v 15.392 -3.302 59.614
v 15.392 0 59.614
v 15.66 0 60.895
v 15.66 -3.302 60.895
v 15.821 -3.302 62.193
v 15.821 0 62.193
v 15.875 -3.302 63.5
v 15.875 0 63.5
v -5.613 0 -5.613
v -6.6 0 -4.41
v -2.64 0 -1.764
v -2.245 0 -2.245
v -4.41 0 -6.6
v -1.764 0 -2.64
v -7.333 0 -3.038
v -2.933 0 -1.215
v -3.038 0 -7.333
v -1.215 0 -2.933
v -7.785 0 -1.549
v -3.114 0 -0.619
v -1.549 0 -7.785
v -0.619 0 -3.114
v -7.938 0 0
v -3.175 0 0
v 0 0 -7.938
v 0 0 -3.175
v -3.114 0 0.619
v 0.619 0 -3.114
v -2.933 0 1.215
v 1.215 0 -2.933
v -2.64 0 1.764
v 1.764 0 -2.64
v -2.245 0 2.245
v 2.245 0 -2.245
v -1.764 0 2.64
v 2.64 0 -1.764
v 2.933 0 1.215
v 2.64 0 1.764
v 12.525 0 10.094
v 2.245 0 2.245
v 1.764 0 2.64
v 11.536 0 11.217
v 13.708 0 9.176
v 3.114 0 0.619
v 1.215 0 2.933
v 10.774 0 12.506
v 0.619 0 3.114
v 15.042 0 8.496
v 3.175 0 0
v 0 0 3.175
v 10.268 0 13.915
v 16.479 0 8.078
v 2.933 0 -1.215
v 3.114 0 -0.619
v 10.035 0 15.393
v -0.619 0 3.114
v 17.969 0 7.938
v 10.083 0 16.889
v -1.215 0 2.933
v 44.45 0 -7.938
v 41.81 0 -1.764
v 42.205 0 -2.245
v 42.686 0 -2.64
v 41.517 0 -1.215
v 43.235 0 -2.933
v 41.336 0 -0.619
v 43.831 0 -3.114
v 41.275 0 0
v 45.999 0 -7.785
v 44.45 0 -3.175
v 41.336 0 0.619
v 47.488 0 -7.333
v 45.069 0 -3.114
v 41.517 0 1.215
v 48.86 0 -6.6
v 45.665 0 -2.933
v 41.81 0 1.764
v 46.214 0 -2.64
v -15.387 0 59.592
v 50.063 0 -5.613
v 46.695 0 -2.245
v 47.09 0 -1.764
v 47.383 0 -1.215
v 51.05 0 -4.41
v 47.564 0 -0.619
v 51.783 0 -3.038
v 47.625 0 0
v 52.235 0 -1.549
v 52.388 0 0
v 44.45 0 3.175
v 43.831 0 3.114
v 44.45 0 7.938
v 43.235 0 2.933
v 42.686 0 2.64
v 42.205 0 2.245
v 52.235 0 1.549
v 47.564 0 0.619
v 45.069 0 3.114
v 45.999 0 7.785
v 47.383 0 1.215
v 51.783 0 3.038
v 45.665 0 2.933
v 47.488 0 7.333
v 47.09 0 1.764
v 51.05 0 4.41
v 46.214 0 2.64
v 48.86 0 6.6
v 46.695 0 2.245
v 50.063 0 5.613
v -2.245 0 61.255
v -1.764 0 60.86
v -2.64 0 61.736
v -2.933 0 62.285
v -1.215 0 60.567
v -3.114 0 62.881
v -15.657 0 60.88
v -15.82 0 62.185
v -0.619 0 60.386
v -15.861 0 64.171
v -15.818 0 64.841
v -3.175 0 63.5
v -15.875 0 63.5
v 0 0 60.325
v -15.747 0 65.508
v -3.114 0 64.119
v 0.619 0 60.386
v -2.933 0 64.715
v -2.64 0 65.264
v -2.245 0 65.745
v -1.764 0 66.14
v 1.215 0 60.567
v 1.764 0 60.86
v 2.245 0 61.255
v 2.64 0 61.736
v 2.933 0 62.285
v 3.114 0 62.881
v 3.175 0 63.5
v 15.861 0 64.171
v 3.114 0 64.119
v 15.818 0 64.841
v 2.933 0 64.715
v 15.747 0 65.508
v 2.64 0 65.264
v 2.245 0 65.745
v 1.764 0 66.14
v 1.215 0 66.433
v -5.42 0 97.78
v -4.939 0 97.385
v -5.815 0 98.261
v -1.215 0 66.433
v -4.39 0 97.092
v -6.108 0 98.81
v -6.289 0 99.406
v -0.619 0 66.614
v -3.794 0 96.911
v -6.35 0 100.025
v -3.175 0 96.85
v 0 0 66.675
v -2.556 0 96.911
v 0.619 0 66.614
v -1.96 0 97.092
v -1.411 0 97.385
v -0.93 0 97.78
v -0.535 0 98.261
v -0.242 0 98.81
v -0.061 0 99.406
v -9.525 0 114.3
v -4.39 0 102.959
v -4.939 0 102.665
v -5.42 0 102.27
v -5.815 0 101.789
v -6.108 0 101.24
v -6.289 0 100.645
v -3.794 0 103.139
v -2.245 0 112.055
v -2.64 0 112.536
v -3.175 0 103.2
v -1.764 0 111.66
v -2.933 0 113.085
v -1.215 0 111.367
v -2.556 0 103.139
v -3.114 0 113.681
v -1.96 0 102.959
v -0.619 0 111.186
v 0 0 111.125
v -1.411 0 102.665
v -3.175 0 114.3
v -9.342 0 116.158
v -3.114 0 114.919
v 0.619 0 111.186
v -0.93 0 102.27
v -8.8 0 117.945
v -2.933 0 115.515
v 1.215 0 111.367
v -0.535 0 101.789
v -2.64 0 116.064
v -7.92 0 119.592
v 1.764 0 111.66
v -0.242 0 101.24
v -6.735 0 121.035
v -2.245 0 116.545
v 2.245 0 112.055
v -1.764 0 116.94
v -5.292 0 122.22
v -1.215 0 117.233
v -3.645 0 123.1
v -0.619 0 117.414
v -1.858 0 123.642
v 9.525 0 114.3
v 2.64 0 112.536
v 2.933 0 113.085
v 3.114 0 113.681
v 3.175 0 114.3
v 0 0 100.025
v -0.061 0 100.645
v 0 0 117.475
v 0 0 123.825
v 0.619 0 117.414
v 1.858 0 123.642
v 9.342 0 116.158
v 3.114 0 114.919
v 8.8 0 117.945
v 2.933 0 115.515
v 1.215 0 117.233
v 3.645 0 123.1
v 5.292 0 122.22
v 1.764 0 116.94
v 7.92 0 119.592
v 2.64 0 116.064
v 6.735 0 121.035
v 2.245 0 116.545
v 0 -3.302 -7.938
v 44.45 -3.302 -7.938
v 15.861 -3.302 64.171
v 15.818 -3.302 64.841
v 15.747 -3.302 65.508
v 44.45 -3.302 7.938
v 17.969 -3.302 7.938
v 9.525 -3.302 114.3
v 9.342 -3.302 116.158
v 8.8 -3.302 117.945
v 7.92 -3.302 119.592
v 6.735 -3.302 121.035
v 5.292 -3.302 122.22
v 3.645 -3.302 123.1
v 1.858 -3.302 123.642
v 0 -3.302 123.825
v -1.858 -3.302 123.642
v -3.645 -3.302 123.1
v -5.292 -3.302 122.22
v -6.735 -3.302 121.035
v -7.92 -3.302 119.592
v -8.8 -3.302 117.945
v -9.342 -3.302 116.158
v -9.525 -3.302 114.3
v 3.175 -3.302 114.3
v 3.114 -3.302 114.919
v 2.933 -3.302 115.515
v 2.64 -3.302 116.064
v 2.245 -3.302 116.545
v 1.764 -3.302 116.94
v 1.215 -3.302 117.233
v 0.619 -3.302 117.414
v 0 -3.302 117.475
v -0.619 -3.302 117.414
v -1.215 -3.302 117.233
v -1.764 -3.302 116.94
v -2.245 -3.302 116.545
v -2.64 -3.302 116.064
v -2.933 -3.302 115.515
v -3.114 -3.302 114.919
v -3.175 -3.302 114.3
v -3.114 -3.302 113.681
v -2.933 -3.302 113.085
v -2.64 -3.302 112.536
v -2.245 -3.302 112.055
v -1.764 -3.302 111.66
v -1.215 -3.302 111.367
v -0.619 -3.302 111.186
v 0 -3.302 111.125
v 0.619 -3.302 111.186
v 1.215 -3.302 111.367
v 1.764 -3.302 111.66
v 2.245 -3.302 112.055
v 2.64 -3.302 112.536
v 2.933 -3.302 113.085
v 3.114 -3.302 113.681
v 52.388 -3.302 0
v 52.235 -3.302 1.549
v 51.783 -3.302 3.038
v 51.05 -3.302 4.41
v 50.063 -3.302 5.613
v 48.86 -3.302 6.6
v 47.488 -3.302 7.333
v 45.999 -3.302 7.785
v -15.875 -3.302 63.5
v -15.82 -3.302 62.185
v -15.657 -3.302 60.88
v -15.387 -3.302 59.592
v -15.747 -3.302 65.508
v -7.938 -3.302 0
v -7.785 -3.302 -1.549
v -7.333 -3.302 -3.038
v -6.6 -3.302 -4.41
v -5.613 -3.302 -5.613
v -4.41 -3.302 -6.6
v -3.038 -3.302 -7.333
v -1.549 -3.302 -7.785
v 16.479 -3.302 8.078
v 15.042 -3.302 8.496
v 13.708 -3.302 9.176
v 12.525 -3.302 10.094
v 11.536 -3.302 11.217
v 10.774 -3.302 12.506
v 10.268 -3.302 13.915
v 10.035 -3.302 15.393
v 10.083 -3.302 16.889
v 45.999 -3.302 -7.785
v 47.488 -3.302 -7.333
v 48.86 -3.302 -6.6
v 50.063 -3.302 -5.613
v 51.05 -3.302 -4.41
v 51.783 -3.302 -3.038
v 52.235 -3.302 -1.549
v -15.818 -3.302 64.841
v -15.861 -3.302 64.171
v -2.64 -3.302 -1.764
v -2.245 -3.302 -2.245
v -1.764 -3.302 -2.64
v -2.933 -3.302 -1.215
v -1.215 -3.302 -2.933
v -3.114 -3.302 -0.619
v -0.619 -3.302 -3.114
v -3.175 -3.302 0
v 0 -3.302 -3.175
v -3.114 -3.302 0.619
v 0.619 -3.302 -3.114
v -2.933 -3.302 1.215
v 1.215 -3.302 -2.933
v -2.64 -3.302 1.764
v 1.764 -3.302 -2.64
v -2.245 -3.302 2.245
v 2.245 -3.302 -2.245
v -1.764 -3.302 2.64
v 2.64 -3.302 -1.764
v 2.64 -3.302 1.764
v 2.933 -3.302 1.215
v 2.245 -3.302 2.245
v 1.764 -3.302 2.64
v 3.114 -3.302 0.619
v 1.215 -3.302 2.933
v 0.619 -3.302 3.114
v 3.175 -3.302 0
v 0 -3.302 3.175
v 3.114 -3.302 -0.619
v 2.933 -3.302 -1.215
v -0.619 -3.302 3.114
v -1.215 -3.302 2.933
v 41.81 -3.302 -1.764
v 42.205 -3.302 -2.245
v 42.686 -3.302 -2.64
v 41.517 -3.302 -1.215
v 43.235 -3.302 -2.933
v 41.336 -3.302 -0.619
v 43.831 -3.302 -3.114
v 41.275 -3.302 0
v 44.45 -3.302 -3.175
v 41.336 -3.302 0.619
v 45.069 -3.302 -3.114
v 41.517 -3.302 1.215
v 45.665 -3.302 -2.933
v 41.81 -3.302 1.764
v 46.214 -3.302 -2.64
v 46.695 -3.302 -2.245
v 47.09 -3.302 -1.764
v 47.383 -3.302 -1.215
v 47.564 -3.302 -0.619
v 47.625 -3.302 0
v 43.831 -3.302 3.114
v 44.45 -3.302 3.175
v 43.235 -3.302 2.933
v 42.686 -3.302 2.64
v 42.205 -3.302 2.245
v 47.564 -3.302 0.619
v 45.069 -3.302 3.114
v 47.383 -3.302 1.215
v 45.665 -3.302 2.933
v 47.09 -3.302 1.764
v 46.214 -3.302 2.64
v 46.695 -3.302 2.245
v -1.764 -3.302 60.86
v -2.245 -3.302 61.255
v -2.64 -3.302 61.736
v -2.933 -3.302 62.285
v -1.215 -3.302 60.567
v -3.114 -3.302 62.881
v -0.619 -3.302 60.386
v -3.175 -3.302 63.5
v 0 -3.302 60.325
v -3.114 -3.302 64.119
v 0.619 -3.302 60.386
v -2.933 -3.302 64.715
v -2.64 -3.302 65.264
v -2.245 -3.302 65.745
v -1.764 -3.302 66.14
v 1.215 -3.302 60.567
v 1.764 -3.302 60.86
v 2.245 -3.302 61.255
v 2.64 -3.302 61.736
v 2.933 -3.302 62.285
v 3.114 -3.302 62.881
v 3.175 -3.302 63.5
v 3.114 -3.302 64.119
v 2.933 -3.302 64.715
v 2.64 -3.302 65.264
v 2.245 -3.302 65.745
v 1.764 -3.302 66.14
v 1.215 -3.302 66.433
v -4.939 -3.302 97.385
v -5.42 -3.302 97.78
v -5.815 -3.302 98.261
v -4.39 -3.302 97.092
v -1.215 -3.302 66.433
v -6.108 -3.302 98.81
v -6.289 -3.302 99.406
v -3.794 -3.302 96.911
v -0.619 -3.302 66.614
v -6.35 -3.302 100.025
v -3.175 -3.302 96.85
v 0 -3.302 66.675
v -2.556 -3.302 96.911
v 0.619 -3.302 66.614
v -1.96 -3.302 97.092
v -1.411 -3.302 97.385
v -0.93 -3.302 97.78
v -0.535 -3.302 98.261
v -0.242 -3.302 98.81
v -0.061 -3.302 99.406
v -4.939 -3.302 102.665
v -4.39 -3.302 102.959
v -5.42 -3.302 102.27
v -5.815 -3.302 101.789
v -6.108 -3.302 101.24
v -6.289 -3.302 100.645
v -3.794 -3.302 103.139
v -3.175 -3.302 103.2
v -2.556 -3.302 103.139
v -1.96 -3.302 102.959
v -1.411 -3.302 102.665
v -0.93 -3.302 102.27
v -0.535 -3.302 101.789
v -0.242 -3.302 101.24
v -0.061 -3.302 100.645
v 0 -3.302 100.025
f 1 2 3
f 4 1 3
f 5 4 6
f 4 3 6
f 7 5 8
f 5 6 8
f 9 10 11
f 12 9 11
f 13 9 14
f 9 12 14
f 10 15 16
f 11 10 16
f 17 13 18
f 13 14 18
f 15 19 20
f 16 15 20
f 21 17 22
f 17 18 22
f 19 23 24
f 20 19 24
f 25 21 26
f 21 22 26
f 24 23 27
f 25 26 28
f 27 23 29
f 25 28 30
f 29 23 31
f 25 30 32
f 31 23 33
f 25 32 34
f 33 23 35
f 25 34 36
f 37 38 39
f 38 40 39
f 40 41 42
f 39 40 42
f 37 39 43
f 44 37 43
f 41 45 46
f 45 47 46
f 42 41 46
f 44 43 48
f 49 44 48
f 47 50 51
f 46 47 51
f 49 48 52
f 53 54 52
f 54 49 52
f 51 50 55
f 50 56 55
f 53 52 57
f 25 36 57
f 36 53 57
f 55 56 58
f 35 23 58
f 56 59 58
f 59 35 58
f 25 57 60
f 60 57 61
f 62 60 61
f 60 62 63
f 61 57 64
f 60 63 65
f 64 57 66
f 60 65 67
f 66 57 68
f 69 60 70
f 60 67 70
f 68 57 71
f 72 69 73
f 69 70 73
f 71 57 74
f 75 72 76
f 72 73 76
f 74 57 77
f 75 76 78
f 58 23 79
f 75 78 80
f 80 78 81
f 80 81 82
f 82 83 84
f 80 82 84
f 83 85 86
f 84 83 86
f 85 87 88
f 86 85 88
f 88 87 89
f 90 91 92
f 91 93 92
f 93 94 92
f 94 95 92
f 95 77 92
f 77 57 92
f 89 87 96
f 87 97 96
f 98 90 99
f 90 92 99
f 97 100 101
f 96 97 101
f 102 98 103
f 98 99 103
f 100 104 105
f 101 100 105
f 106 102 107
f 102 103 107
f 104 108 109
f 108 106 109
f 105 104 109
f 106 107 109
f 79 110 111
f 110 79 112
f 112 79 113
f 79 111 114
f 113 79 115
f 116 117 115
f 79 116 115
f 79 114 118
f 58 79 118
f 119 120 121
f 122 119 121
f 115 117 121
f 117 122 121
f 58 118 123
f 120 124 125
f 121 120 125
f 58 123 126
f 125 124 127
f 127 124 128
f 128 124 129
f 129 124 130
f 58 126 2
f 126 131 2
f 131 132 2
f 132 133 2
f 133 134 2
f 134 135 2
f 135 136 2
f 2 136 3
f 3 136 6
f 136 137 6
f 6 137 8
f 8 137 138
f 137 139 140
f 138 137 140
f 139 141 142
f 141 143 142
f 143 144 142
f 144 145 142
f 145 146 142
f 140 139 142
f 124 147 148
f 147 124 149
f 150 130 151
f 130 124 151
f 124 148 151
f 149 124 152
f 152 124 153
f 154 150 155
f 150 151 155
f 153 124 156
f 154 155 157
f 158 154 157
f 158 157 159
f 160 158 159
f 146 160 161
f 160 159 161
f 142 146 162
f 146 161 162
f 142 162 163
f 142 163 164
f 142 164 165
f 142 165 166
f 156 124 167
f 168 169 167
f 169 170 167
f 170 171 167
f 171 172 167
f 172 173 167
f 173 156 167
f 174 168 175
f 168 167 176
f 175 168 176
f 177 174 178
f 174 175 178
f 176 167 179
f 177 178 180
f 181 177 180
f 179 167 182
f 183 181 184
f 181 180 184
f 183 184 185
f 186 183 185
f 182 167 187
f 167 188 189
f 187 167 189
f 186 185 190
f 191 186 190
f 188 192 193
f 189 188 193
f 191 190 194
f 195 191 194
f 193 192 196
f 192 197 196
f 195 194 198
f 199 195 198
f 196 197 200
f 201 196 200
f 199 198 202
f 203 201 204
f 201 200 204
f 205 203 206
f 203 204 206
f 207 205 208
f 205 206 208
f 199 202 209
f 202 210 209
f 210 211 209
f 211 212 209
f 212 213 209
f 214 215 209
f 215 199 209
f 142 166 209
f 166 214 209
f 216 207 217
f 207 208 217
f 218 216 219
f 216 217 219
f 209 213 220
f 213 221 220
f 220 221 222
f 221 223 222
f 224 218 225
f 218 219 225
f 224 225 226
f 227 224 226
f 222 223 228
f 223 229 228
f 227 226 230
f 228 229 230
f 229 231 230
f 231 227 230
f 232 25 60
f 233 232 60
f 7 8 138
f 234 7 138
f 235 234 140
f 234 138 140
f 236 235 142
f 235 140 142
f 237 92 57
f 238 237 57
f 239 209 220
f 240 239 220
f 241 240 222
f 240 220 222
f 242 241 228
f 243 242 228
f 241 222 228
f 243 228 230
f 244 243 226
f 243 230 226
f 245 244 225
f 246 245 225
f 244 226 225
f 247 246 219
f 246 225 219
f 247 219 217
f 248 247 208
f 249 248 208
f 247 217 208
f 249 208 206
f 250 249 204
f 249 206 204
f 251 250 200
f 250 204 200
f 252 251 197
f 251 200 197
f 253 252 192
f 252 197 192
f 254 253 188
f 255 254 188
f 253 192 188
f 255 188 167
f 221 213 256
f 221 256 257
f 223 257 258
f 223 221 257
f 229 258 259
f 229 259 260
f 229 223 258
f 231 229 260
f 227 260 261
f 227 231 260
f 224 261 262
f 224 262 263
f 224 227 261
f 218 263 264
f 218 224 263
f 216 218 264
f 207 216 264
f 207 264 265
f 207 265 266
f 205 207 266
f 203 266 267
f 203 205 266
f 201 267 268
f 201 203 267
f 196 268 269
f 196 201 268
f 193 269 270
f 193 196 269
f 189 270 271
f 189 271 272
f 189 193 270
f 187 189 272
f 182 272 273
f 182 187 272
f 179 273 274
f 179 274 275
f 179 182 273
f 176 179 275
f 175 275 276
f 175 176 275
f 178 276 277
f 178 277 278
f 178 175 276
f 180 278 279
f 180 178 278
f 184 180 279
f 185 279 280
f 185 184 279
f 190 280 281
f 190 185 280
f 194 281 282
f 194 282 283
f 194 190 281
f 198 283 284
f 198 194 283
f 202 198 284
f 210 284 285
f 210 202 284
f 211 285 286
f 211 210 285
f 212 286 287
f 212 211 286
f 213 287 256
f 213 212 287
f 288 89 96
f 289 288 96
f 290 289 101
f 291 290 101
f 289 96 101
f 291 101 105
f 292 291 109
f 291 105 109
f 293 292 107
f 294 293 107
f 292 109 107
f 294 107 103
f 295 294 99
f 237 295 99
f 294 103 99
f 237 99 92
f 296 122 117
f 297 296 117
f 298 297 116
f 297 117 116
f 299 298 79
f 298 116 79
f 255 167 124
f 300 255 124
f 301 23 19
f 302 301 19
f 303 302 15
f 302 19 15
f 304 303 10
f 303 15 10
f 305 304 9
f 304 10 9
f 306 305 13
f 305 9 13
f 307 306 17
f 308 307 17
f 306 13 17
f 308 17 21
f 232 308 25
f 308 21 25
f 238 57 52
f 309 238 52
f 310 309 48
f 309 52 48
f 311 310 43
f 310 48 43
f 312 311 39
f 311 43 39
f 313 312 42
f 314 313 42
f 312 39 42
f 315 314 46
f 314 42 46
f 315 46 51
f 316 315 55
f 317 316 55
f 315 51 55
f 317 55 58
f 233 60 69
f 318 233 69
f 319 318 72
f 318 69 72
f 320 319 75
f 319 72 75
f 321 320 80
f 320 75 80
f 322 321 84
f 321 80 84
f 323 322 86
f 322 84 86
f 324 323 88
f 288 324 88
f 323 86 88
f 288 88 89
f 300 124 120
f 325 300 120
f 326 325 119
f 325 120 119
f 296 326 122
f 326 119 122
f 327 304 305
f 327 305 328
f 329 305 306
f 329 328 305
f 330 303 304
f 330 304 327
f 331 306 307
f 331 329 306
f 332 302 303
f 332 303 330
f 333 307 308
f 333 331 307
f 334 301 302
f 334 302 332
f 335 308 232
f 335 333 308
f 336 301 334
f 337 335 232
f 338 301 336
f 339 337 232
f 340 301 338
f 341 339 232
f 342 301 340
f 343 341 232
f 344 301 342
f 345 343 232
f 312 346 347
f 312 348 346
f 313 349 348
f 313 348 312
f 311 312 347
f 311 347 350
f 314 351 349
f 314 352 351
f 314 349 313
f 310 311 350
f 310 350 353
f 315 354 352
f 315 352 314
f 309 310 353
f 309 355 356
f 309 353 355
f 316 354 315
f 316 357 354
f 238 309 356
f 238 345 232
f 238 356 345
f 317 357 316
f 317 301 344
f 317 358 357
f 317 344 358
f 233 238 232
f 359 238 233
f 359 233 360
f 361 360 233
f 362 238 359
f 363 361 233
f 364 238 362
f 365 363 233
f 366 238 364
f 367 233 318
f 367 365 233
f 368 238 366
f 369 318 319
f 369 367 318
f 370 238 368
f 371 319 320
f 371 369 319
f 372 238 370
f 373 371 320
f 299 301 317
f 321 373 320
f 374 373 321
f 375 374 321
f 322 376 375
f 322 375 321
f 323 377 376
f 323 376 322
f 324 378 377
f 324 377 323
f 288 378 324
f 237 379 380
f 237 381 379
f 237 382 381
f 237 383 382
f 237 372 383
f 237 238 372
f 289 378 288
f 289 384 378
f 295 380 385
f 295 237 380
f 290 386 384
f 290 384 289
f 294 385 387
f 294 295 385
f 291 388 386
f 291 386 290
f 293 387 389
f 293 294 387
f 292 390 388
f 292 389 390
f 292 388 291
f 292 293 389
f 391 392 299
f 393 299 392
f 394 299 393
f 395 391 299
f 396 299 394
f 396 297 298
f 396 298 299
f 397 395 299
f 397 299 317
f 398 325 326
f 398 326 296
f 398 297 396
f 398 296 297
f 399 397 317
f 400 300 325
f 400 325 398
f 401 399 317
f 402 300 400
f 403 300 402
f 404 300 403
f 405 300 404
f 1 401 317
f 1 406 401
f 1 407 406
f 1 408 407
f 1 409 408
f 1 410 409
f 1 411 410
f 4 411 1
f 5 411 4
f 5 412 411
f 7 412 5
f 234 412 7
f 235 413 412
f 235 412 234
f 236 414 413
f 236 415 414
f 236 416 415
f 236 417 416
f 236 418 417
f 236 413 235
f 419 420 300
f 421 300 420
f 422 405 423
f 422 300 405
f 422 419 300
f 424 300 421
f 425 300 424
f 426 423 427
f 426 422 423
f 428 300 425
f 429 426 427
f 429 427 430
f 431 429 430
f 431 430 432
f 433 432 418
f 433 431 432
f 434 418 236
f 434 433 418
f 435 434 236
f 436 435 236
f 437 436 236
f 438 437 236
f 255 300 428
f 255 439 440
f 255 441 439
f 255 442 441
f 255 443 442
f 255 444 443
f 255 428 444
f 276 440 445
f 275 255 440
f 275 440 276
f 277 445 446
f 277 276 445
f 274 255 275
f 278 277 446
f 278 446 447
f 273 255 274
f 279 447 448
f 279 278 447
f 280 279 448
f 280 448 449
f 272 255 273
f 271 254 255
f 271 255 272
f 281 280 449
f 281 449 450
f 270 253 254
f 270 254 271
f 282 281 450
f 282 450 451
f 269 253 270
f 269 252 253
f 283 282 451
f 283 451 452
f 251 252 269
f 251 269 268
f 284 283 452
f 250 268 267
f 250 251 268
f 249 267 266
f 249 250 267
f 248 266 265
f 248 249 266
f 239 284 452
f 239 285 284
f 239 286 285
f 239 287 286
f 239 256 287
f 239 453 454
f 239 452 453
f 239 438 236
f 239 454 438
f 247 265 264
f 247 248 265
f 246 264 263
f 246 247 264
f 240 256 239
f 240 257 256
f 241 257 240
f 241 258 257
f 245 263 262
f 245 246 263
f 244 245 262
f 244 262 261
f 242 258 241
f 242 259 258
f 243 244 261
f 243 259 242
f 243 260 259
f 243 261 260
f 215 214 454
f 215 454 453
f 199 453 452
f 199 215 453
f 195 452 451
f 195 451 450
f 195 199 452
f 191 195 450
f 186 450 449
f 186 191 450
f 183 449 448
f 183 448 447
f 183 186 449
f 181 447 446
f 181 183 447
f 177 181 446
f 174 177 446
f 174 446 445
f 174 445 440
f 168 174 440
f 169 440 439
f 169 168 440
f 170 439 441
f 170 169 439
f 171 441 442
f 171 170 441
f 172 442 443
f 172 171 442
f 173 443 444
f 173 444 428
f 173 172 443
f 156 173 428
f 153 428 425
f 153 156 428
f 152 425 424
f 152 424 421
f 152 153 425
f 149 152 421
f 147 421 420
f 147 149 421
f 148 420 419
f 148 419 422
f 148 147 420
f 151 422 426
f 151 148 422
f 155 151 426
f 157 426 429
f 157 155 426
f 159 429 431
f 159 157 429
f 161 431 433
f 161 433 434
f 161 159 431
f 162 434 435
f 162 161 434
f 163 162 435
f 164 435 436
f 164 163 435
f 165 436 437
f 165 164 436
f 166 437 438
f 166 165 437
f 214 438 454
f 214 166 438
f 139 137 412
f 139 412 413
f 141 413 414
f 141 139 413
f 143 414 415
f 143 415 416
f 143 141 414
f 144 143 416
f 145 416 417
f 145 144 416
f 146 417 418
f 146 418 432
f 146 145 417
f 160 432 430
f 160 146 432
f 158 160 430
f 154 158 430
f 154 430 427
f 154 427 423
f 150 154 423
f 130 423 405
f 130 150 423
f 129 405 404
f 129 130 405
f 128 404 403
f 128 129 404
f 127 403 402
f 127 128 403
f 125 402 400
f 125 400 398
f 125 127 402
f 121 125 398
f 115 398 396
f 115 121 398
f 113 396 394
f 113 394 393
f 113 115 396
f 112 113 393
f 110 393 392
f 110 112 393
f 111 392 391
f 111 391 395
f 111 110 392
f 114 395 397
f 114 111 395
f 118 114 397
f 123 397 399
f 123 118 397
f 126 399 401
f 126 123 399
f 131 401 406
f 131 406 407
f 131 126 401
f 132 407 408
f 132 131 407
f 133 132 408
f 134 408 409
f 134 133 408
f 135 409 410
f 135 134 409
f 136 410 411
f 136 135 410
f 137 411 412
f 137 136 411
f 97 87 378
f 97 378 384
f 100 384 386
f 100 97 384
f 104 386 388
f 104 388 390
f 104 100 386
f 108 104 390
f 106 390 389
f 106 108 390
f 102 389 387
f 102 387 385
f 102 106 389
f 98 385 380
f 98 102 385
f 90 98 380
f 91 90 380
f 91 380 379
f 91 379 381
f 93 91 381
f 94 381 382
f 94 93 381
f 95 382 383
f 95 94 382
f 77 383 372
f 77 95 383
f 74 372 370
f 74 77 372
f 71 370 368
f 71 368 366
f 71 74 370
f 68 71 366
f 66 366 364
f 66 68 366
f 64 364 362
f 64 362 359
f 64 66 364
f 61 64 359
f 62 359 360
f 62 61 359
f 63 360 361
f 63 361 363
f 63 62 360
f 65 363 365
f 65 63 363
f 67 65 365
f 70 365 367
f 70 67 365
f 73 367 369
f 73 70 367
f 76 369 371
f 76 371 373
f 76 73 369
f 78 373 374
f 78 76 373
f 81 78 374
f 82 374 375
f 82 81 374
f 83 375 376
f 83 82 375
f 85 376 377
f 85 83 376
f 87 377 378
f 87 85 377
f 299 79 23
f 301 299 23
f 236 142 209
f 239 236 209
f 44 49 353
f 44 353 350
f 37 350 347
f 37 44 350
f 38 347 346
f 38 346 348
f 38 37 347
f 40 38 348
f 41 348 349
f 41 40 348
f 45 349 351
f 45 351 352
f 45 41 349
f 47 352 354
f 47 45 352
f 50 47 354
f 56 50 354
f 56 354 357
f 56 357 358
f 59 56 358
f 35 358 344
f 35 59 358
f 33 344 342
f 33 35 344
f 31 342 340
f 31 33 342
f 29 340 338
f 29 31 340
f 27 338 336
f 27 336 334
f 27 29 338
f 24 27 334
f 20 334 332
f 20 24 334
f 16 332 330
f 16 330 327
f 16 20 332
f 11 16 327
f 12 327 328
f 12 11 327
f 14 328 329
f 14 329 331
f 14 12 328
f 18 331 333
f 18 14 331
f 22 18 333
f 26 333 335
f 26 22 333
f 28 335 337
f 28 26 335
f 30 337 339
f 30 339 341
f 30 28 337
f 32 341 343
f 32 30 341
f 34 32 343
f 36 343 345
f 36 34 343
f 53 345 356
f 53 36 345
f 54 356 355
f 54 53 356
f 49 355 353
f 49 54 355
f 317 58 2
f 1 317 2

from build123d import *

# Parameters (mm, degrees)
F0_R     = 3.175
F1_DEPTH = 3.302


with BuildPart() as f1:
    # F0 (on Front) → F1 (new body)
    with BuildSketch(Plane.XZ):
        with BuildLine():
            ThreePointArc((-9.525, 114.3), (0, 104.775), (9.525, 114.3))
            ThreePointArc((9.525, 114.3), (0, 123.825), (-9.525, 114.3))
        make_face()
        with Locations((0, 114.3)):
            Circle(F0_R, mode=Mode.SUBTRACT)
        with BuildLine():
            Line((15.747457, 65.508289), (9.525, 114.3))
            ThreePointArc((9.525, 114.3), (0, 104.775), (-9.525, 114.3))
            Line((-9.525, 114.3), (-15.747457, 65.508289))
            ThreePointArc((-15.747457, 65.508289), (0, 79.375), (15.747457, 65.508289))
        make_face()
        with Locations((-3.175, 100.0252)):
            Circle(F0_R, mode=Mode.SUBTRACT)
        with BuildLine():
            ThreePointArc((15.875, 63.5), (15.843082, 64.506168), (15.747457, 65.508289))
            ThreePointArc((15.747457, 65.508289), (0, 79.375), (-15.747457, 65.508289))
            ThreePointArc((-15.747457, 65.508289), (-15.843082, 64.506168), (-15.875, 63.5))
            Line((-15.875, 63.5), (-15.386538, 59.592308))
            ThreePointArc((-15.386538, 59.592308), (0.011376, 47.625004), (15.392123, 59.614363))
            Line((15.392123, 59.614363), (15.875, 63.5))
        make_face()
        with Locations((0, 63.5)):
            Circle(F0_R, mode=Mode.SUBTRACT)
        with BuildLine():
            ThreePointArc((15.392123, 59.614363), (15.753818, 61.542237), (15.875, 63.5))
            Line((15.875, 63.5), (15.392123, 59.614363))
        make_face()
        with BuildLine():
            Line((-15.386538, 59.592308), (-15.875, 63.5))
            ThreePointArc((-15.875, 63.5), (-15.752411, 61.530949), (-15.386538, 59.592308))
        make_face()
        with BuildLine():
            Line((10.082594, 16.889395), (15.392123, 59.614363))
            ThreePointArc((15.392123, 59.614363), (0.011376, 47.625004), (-15.386538, 59.592308))
            Line((-15.386538, 59.592308), (-7.9375, 0))
            ThreePointArc((-7.9375, 0), (0, 7.9375), (7.9375, 0))
            ThreePointArc((7.9375, 0), (5.61266, -5.61266), (0, -7.9375))
            Line((0, -7.9375), (44.45, -7.9375))
            ThreePointArc((44.45, -7.9375), (36.5125, 0), (44.45, 7.9375))
            Line((44.45, 7.9375), (17.969436, 7.9375))
            ThreePointArc((17.969436, 7.9375), (12.004147, 10.632131), (10.082594, 16.889395))
        make_face()
        with BuildLine():
            ThreePointArc((7.9375, 0), (0, 7.9375), (-7.9375, 0))
            ThreePointArc((-7.9375, 0), (-5.61266, -5.61266), (0, -7.9375))
            ThreePointArc((0, -7.9375), (5.61266, -5.61266), (7.9375, 0))
        make_face()
        Circle(F0_R, mode=Mode.SUBTRACT)
        with BuildLine():
            ThreePointArc((52.3875, 0), (50.06266, 5.61266), (44.45, 7.9375))
            ThreePointArc((44.45, 7.9375), (36.5125, 0), (44.45, -7.9375))
            ThreePointArc((44.45, -7.9375), (50.06266, -5.61266), (52.3875, 0))
        make_face()
        with Locations((44.45, 0)):
            Circle(F0_R, mode=Mode.SUBTRACT)
    extrude(amount=F1_DEPTH)


solid = f1.part
